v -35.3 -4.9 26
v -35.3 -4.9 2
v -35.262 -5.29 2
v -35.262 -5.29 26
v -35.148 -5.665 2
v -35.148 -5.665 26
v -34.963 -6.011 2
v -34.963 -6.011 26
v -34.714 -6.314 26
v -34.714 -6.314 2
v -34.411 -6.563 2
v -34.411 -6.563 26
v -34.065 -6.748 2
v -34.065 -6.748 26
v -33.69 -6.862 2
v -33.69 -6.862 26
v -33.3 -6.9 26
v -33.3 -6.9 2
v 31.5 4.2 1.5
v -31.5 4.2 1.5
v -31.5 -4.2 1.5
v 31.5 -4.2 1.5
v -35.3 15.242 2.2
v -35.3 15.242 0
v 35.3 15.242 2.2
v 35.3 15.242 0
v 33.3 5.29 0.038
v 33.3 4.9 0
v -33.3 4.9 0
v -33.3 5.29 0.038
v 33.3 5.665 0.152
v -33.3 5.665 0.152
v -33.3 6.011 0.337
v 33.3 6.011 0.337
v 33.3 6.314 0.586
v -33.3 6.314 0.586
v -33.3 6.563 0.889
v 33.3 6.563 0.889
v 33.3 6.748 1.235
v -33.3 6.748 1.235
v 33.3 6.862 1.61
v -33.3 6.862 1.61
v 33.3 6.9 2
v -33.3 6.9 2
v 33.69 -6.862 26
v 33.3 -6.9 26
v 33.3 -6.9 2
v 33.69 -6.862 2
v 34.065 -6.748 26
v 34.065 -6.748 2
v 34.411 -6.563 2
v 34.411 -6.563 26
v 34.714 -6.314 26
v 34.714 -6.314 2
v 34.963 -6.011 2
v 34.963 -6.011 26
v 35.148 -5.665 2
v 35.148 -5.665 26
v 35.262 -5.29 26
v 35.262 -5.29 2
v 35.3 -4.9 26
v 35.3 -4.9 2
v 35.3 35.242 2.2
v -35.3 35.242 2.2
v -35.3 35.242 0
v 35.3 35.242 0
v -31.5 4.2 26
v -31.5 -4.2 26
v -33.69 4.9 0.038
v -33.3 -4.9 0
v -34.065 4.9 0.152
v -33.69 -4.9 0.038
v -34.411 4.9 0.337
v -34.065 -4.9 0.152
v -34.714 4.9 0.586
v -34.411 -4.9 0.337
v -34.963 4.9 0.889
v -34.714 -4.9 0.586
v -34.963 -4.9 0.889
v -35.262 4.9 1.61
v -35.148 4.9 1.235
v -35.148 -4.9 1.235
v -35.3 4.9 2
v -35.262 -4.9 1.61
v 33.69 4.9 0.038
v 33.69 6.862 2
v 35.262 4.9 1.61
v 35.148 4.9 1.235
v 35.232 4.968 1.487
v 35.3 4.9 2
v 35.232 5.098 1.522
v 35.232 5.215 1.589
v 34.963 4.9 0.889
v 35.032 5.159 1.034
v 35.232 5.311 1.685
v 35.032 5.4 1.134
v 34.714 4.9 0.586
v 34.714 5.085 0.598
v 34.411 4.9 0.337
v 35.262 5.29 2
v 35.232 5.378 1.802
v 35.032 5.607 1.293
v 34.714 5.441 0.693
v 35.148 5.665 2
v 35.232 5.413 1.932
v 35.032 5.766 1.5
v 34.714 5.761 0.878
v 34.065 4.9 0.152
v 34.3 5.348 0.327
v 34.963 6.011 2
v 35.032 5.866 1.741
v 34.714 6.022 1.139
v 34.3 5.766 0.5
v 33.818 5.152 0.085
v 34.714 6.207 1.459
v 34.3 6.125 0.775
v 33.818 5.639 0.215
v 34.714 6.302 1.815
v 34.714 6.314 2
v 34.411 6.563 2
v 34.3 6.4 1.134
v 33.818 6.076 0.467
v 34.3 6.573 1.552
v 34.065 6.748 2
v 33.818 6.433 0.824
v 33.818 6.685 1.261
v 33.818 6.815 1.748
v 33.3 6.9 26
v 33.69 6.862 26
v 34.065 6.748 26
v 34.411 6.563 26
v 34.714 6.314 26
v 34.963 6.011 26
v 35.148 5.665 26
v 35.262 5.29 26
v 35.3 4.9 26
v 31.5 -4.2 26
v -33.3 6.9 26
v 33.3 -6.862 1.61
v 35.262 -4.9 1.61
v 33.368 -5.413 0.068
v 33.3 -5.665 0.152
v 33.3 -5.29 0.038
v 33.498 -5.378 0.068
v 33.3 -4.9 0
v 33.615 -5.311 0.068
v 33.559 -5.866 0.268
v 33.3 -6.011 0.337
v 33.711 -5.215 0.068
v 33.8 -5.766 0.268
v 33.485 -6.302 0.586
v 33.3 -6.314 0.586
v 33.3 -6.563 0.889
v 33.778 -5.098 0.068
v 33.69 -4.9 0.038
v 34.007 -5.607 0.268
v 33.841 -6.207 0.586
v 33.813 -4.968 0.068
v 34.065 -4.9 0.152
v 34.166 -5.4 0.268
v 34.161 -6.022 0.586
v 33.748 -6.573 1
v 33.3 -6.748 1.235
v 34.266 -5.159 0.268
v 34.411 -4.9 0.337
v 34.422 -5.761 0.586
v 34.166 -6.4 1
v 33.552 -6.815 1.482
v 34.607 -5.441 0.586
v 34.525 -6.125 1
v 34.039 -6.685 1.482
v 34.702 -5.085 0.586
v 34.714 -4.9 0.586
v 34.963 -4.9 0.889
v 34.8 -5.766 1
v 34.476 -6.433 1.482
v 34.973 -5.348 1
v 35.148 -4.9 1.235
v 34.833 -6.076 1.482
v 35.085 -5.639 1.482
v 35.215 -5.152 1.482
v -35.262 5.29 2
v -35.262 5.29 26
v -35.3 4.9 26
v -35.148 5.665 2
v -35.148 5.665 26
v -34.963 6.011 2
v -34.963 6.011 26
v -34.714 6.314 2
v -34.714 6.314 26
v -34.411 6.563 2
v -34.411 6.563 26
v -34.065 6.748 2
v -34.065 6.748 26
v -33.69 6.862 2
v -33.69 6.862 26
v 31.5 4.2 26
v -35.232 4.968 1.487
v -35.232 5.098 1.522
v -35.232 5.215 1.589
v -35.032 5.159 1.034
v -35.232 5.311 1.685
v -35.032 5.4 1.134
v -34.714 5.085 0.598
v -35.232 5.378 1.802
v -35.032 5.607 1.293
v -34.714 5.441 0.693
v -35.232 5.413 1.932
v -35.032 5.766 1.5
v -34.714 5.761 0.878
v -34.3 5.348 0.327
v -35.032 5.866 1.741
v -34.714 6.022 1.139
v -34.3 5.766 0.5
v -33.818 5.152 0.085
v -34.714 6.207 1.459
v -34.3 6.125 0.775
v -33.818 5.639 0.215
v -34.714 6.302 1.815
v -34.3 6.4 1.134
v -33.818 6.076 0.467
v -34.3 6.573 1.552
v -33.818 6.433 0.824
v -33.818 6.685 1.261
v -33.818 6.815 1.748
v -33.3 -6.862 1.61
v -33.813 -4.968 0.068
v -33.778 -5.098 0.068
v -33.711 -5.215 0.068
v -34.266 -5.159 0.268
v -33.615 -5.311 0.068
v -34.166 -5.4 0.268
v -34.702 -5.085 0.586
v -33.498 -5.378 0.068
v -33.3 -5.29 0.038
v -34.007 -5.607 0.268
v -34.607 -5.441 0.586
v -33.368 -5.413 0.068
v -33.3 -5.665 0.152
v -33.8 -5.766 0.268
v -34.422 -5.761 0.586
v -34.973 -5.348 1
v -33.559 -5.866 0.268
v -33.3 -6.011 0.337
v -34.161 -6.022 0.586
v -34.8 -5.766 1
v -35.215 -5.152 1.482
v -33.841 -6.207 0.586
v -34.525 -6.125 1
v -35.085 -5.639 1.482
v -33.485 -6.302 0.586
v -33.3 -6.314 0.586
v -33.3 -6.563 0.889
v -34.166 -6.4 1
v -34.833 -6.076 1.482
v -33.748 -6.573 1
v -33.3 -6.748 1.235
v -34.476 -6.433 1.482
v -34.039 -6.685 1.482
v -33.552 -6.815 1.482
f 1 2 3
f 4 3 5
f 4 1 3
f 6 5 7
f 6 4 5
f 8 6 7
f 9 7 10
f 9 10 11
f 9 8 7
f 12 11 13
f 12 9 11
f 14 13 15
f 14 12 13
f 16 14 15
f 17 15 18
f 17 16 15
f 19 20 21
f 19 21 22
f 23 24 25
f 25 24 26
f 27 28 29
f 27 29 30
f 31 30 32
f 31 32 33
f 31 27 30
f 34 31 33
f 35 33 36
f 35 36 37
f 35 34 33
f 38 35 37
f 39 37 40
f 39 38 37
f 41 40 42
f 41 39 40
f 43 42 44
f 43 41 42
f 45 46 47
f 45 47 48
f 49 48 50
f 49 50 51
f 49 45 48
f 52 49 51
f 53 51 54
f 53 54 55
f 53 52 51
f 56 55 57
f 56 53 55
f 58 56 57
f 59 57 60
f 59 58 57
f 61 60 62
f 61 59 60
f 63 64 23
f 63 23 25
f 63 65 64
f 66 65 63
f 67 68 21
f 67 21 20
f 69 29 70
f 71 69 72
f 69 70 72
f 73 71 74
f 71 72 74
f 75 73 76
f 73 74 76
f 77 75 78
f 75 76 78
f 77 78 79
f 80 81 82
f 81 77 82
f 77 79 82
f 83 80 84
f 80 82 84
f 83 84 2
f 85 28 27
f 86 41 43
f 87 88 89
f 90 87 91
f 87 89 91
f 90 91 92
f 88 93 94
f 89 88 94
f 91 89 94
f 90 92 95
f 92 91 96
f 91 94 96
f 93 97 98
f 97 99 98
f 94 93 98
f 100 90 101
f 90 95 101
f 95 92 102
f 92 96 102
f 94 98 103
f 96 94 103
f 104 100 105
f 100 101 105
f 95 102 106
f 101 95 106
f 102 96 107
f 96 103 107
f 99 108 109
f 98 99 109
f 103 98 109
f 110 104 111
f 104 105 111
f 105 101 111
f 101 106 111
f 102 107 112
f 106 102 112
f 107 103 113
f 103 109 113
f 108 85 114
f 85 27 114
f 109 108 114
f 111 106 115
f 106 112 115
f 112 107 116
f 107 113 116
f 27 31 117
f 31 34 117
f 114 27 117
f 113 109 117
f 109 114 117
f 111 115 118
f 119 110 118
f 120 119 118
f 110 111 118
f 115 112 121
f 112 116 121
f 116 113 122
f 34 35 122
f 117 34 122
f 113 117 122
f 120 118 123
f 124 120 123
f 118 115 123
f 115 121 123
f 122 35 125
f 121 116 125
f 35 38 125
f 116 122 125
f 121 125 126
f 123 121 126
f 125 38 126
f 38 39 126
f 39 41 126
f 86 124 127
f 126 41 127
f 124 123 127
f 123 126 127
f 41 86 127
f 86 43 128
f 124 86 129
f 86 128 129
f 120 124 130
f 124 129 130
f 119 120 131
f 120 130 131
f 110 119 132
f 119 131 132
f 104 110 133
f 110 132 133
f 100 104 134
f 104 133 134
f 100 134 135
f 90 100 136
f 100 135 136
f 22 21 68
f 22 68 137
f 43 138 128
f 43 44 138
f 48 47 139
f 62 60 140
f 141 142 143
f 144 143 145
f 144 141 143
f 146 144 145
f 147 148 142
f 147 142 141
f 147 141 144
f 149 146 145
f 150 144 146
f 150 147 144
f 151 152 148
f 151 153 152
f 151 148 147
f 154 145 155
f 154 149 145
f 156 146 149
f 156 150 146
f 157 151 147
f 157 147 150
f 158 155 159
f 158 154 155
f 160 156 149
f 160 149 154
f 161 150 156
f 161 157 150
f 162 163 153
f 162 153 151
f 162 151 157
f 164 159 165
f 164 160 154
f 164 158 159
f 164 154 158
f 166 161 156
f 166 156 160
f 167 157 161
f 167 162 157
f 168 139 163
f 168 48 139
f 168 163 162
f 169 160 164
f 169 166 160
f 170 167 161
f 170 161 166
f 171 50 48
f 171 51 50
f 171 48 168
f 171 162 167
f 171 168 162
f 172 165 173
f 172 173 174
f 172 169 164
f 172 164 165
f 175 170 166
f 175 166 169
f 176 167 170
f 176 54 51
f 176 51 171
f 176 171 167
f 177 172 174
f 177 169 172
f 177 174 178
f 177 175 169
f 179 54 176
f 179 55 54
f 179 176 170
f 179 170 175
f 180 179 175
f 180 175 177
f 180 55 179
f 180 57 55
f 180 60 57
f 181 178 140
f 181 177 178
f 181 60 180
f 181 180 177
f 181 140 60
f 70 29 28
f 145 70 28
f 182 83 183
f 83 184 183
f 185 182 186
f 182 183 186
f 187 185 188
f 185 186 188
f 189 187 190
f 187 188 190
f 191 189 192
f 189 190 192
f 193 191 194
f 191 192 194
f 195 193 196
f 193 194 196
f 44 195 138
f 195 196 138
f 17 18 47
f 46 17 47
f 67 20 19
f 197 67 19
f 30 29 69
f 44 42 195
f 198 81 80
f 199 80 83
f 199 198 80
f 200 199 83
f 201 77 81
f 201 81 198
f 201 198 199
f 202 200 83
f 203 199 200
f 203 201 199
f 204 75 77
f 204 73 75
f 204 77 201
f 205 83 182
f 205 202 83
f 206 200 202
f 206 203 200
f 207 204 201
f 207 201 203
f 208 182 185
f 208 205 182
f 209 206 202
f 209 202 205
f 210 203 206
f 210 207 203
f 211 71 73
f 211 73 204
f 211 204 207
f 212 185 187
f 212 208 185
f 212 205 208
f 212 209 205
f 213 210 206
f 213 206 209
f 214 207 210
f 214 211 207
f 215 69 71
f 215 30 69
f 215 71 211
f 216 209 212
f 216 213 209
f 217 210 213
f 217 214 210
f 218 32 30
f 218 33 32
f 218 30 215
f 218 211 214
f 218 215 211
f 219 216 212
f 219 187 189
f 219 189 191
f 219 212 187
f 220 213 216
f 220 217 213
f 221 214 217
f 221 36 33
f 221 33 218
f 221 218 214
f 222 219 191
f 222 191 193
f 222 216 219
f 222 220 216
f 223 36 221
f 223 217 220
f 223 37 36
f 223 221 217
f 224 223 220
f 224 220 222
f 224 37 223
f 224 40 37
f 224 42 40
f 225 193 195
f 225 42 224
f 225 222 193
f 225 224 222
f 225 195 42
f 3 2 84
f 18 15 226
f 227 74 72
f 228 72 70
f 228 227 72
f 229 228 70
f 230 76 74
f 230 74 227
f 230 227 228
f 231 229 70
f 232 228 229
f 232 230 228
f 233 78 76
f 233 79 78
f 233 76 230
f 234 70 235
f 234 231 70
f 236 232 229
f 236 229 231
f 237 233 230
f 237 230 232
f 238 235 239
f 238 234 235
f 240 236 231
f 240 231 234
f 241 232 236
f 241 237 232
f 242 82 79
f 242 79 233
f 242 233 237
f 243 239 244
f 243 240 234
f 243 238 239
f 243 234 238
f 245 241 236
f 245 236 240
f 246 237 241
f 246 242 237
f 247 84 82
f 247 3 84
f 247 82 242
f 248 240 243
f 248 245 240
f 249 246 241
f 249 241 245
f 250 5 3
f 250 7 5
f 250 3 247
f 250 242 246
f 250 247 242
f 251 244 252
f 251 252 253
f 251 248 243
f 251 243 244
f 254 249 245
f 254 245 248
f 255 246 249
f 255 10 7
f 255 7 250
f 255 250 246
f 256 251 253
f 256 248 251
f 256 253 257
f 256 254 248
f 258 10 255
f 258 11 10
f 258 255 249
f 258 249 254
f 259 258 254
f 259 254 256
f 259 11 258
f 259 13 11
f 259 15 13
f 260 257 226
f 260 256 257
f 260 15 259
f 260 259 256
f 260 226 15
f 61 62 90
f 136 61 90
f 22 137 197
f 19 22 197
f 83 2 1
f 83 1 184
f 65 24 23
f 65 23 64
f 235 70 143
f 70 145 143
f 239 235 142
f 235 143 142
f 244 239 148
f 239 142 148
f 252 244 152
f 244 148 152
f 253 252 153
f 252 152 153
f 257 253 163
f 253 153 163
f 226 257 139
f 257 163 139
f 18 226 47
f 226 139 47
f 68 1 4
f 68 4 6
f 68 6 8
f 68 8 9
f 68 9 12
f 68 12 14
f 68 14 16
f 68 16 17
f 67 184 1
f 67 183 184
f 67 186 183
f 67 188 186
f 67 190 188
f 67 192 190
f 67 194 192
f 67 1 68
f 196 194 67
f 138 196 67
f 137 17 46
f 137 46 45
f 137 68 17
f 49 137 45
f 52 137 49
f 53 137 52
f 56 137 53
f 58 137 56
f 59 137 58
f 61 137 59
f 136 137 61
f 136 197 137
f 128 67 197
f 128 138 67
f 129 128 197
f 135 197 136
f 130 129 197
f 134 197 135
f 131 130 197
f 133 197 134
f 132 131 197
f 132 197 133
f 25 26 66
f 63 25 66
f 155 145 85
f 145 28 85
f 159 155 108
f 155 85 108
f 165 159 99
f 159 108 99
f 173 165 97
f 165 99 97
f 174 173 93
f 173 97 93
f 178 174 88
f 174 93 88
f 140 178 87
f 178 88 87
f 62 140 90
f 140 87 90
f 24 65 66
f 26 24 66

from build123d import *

# Parameters (mm, degrees)
F0_W     = 70.6
F0_H     = 13.8
F0_W_2   = 63
F0_H_2   = 8.4
F1_DEPTH = 26
F2_DEPTH = 1.5
F3_R     = 2
F4_R     = 2
F0_H_3   = 20
F5_DEPTH = 2.2


with BuildPart() as f1:
    # F0 (on Top) → F1 (new body)
    with BuildSketch(Plane.XY):
        Rectangle(F0_W, F0_H)
        Rectangle(F0_W_2, F0_H_2, mode=Mode.SUBTRACT)
    extrude(amount=F1_DEPTH)

    # F0 (on Top) → F2 (join)
    with BuildSketch(Plane.XY):
        Rectangle(F0_W_2, F0_H_2)
    extrude(amount=F2_DEPTH)

    # F3
    f3_edges = [f1.edges().sort_by_distance(p)[0] for p in [
        (-35.3, -6.9, 13),
        (35.3, -6.9, 13),
    ]]
    fillet(f3_edges, radius=F3_R)

    # F4
    f4_edges = [f1.edges().sort_by_distance(p)[0] for p in [
        (0, 6.9, 0),
        (0, -6.9, 0),
        (-35.3, 6.9, 13),
        (35.3, 6.9, 13),
    ]]
    fillet(f4_edges, radius=F4_R)


with BuildPart() as f5:
    # F0 (on Top) → F5 (new body)
    with BuildSketch(Plane.XY):
        with Locations((0, 25.242081)):
            Rectangle(F0_W, F0_H_3)
    extrude(amount=F5_DEPTH)


solid = Compound([f1.part, f5.part])
